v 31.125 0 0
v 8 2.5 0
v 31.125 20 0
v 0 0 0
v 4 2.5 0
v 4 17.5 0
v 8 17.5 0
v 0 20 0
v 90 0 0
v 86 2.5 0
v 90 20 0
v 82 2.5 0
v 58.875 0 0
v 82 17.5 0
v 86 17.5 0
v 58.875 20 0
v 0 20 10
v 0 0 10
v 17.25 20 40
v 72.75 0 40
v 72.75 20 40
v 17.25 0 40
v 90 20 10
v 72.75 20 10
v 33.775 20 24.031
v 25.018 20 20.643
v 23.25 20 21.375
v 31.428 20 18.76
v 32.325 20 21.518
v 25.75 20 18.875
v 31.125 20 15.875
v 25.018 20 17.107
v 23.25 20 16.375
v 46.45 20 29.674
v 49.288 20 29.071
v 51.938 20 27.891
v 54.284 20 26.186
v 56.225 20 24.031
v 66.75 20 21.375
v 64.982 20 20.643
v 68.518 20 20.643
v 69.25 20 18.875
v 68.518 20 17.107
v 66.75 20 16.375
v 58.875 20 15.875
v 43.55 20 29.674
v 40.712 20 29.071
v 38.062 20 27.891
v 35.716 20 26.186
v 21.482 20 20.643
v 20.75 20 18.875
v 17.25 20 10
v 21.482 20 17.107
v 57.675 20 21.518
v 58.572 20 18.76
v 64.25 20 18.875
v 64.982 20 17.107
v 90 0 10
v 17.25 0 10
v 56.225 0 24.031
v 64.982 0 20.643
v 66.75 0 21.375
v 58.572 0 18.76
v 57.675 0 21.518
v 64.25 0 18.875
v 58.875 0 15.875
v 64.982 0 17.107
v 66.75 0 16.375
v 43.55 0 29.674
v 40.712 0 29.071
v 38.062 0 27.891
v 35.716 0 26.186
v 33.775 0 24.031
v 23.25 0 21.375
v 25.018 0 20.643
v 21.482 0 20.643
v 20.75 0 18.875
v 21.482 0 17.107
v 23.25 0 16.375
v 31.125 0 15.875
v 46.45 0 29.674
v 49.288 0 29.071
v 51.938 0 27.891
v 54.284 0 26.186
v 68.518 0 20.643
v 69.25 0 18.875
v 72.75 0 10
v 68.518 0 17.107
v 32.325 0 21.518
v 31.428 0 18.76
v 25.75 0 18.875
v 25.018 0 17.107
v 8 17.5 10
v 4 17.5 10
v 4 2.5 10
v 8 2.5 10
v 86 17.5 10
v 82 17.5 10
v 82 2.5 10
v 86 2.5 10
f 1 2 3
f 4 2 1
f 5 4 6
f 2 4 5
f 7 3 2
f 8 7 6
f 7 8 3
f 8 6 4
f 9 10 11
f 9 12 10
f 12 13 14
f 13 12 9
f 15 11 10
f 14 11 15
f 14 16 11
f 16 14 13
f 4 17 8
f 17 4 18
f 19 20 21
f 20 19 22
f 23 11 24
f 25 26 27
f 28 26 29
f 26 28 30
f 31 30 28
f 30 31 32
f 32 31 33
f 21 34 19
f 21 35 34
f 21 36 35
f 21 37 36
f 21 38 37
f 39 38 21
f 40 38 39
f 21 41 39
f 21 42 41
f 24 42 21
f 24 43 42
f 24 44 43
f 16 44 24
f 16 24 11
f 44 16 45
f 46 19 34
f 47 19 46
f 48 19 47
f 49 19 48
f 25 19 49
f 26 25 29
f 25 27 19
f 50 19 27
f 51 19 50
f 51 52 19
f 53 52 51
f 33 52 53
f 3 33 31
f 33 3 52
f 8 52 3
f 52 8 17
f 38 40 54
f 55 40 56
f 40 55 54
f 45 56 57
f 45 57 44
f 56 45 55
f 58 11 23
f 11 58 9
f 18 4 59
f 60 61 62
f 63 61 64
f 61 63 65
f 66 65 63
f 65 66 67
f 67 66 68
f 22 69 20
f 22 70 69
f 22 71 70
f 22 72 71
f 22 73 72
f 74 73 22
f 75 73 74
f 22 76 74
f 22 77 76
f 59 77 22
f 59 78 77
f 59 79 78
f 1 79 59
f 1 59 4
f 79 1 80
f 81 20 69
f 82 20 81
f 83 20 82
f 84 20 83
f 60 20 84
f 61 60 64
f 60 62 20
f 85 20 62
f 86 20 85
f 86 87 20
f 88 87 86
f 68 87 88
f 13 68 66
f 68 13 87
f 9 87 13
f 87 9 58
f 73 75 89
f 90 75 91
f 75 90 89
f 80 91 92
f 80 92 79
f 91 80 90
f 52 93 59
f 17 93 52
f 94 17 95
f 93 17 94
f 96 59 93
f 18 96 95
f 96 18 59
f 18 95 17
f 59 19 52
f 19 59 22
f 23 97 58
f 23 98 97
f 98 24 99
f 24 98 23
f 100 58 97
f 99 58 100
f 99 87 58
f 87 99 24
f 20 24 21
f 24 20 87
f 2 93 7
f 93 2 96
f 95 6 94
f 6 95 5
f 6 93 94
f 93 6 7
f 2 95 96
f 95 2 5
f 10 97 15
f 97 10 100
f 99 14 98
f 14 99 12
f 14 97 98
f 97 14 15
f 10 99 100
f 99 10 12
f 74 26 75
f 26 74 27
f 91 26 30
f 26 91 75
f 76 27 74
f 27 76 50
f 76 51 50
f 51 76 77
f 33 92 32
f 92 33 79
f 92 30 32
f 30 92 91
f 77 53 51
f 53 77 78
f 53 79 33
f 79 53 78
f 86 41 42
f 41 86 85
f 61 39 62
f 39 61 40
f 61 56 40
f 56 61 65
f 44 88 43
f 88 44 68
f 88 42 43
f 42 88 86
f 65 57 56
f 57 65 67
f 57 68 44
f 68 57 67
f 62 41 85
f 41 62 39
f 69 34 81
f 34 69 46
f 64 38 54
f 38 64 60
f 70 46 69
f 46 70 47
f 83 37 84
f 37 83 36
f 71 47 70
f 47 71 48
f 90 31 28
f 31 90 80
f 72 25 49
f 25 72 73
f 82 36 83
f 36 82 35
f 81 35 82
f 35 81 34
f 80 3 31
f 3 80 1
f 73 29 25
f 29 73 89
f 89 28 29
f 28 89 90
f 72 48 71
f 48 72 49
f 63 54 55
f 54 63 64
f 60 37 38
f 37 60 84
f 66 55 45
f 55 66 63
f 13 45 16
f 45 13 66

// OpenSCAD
syringediameter= 27.75;
//30.9
syringeradius= syringediameter/2;
widthofpart=20;
//sideflapwidth= 15;
sideflapwidth= 90- syringediameter - 45;

difference(){
translate([0,0,20])
    linear_extrude(
    height = 40, 
    center = true, 
    convexity = 10, 
    twist = 0)
    square([90,widthofpart]);
    
//Origin box    
translate([0,0,25])
    linear_extrude(
    height = 30, 
    center = true, 
    convexity = 10, 
    twist = 0)
    square([sideflapwidth,widthofpart]);
    
//Right side box
translate([90- sideflapwidth,0,25])
    linear_extrude(
    height = 30, 
    center = true, 
    convexity = 10, 
    twist = 0)
    square([sideflapwidth,widthofpart]);
    
//Origin woodscrew

     

//center hole square  
translate([6-2, widthofpart/2 - 7.5, 0])
    cube([4,15, widthofpart]); 



//Right woodscrew
 //center hole square  
translate([90-6-2, widthofpart/2 - 7.5, 0])
    cube([4,15, widthofpart]); 


//Top origin screw
translate([sideflapwidth + 6, widthofpart, syringeradius+5])
rotate([90,0,0])
cylinder (h=widthofpart*2, r=2.5);

//Top right screw
translate([90-sideflapwidth-6, widthofpart, syringeradius+5])
rotate([90,0,0])
cylinder (h=widthofpart*2, r=2.5);


hull(){
//Center hole circle
translate([45, widthofpart, syringeradius+2])
rotate([90,0,0])
cylinder (h=widthofpart*3, r=syringeradius);
     

//center hole square  
translate([45-syringeradius,widthofpart, -10])
    cube([syringeradius*2,10, syringeradius+10]); 
}

}
